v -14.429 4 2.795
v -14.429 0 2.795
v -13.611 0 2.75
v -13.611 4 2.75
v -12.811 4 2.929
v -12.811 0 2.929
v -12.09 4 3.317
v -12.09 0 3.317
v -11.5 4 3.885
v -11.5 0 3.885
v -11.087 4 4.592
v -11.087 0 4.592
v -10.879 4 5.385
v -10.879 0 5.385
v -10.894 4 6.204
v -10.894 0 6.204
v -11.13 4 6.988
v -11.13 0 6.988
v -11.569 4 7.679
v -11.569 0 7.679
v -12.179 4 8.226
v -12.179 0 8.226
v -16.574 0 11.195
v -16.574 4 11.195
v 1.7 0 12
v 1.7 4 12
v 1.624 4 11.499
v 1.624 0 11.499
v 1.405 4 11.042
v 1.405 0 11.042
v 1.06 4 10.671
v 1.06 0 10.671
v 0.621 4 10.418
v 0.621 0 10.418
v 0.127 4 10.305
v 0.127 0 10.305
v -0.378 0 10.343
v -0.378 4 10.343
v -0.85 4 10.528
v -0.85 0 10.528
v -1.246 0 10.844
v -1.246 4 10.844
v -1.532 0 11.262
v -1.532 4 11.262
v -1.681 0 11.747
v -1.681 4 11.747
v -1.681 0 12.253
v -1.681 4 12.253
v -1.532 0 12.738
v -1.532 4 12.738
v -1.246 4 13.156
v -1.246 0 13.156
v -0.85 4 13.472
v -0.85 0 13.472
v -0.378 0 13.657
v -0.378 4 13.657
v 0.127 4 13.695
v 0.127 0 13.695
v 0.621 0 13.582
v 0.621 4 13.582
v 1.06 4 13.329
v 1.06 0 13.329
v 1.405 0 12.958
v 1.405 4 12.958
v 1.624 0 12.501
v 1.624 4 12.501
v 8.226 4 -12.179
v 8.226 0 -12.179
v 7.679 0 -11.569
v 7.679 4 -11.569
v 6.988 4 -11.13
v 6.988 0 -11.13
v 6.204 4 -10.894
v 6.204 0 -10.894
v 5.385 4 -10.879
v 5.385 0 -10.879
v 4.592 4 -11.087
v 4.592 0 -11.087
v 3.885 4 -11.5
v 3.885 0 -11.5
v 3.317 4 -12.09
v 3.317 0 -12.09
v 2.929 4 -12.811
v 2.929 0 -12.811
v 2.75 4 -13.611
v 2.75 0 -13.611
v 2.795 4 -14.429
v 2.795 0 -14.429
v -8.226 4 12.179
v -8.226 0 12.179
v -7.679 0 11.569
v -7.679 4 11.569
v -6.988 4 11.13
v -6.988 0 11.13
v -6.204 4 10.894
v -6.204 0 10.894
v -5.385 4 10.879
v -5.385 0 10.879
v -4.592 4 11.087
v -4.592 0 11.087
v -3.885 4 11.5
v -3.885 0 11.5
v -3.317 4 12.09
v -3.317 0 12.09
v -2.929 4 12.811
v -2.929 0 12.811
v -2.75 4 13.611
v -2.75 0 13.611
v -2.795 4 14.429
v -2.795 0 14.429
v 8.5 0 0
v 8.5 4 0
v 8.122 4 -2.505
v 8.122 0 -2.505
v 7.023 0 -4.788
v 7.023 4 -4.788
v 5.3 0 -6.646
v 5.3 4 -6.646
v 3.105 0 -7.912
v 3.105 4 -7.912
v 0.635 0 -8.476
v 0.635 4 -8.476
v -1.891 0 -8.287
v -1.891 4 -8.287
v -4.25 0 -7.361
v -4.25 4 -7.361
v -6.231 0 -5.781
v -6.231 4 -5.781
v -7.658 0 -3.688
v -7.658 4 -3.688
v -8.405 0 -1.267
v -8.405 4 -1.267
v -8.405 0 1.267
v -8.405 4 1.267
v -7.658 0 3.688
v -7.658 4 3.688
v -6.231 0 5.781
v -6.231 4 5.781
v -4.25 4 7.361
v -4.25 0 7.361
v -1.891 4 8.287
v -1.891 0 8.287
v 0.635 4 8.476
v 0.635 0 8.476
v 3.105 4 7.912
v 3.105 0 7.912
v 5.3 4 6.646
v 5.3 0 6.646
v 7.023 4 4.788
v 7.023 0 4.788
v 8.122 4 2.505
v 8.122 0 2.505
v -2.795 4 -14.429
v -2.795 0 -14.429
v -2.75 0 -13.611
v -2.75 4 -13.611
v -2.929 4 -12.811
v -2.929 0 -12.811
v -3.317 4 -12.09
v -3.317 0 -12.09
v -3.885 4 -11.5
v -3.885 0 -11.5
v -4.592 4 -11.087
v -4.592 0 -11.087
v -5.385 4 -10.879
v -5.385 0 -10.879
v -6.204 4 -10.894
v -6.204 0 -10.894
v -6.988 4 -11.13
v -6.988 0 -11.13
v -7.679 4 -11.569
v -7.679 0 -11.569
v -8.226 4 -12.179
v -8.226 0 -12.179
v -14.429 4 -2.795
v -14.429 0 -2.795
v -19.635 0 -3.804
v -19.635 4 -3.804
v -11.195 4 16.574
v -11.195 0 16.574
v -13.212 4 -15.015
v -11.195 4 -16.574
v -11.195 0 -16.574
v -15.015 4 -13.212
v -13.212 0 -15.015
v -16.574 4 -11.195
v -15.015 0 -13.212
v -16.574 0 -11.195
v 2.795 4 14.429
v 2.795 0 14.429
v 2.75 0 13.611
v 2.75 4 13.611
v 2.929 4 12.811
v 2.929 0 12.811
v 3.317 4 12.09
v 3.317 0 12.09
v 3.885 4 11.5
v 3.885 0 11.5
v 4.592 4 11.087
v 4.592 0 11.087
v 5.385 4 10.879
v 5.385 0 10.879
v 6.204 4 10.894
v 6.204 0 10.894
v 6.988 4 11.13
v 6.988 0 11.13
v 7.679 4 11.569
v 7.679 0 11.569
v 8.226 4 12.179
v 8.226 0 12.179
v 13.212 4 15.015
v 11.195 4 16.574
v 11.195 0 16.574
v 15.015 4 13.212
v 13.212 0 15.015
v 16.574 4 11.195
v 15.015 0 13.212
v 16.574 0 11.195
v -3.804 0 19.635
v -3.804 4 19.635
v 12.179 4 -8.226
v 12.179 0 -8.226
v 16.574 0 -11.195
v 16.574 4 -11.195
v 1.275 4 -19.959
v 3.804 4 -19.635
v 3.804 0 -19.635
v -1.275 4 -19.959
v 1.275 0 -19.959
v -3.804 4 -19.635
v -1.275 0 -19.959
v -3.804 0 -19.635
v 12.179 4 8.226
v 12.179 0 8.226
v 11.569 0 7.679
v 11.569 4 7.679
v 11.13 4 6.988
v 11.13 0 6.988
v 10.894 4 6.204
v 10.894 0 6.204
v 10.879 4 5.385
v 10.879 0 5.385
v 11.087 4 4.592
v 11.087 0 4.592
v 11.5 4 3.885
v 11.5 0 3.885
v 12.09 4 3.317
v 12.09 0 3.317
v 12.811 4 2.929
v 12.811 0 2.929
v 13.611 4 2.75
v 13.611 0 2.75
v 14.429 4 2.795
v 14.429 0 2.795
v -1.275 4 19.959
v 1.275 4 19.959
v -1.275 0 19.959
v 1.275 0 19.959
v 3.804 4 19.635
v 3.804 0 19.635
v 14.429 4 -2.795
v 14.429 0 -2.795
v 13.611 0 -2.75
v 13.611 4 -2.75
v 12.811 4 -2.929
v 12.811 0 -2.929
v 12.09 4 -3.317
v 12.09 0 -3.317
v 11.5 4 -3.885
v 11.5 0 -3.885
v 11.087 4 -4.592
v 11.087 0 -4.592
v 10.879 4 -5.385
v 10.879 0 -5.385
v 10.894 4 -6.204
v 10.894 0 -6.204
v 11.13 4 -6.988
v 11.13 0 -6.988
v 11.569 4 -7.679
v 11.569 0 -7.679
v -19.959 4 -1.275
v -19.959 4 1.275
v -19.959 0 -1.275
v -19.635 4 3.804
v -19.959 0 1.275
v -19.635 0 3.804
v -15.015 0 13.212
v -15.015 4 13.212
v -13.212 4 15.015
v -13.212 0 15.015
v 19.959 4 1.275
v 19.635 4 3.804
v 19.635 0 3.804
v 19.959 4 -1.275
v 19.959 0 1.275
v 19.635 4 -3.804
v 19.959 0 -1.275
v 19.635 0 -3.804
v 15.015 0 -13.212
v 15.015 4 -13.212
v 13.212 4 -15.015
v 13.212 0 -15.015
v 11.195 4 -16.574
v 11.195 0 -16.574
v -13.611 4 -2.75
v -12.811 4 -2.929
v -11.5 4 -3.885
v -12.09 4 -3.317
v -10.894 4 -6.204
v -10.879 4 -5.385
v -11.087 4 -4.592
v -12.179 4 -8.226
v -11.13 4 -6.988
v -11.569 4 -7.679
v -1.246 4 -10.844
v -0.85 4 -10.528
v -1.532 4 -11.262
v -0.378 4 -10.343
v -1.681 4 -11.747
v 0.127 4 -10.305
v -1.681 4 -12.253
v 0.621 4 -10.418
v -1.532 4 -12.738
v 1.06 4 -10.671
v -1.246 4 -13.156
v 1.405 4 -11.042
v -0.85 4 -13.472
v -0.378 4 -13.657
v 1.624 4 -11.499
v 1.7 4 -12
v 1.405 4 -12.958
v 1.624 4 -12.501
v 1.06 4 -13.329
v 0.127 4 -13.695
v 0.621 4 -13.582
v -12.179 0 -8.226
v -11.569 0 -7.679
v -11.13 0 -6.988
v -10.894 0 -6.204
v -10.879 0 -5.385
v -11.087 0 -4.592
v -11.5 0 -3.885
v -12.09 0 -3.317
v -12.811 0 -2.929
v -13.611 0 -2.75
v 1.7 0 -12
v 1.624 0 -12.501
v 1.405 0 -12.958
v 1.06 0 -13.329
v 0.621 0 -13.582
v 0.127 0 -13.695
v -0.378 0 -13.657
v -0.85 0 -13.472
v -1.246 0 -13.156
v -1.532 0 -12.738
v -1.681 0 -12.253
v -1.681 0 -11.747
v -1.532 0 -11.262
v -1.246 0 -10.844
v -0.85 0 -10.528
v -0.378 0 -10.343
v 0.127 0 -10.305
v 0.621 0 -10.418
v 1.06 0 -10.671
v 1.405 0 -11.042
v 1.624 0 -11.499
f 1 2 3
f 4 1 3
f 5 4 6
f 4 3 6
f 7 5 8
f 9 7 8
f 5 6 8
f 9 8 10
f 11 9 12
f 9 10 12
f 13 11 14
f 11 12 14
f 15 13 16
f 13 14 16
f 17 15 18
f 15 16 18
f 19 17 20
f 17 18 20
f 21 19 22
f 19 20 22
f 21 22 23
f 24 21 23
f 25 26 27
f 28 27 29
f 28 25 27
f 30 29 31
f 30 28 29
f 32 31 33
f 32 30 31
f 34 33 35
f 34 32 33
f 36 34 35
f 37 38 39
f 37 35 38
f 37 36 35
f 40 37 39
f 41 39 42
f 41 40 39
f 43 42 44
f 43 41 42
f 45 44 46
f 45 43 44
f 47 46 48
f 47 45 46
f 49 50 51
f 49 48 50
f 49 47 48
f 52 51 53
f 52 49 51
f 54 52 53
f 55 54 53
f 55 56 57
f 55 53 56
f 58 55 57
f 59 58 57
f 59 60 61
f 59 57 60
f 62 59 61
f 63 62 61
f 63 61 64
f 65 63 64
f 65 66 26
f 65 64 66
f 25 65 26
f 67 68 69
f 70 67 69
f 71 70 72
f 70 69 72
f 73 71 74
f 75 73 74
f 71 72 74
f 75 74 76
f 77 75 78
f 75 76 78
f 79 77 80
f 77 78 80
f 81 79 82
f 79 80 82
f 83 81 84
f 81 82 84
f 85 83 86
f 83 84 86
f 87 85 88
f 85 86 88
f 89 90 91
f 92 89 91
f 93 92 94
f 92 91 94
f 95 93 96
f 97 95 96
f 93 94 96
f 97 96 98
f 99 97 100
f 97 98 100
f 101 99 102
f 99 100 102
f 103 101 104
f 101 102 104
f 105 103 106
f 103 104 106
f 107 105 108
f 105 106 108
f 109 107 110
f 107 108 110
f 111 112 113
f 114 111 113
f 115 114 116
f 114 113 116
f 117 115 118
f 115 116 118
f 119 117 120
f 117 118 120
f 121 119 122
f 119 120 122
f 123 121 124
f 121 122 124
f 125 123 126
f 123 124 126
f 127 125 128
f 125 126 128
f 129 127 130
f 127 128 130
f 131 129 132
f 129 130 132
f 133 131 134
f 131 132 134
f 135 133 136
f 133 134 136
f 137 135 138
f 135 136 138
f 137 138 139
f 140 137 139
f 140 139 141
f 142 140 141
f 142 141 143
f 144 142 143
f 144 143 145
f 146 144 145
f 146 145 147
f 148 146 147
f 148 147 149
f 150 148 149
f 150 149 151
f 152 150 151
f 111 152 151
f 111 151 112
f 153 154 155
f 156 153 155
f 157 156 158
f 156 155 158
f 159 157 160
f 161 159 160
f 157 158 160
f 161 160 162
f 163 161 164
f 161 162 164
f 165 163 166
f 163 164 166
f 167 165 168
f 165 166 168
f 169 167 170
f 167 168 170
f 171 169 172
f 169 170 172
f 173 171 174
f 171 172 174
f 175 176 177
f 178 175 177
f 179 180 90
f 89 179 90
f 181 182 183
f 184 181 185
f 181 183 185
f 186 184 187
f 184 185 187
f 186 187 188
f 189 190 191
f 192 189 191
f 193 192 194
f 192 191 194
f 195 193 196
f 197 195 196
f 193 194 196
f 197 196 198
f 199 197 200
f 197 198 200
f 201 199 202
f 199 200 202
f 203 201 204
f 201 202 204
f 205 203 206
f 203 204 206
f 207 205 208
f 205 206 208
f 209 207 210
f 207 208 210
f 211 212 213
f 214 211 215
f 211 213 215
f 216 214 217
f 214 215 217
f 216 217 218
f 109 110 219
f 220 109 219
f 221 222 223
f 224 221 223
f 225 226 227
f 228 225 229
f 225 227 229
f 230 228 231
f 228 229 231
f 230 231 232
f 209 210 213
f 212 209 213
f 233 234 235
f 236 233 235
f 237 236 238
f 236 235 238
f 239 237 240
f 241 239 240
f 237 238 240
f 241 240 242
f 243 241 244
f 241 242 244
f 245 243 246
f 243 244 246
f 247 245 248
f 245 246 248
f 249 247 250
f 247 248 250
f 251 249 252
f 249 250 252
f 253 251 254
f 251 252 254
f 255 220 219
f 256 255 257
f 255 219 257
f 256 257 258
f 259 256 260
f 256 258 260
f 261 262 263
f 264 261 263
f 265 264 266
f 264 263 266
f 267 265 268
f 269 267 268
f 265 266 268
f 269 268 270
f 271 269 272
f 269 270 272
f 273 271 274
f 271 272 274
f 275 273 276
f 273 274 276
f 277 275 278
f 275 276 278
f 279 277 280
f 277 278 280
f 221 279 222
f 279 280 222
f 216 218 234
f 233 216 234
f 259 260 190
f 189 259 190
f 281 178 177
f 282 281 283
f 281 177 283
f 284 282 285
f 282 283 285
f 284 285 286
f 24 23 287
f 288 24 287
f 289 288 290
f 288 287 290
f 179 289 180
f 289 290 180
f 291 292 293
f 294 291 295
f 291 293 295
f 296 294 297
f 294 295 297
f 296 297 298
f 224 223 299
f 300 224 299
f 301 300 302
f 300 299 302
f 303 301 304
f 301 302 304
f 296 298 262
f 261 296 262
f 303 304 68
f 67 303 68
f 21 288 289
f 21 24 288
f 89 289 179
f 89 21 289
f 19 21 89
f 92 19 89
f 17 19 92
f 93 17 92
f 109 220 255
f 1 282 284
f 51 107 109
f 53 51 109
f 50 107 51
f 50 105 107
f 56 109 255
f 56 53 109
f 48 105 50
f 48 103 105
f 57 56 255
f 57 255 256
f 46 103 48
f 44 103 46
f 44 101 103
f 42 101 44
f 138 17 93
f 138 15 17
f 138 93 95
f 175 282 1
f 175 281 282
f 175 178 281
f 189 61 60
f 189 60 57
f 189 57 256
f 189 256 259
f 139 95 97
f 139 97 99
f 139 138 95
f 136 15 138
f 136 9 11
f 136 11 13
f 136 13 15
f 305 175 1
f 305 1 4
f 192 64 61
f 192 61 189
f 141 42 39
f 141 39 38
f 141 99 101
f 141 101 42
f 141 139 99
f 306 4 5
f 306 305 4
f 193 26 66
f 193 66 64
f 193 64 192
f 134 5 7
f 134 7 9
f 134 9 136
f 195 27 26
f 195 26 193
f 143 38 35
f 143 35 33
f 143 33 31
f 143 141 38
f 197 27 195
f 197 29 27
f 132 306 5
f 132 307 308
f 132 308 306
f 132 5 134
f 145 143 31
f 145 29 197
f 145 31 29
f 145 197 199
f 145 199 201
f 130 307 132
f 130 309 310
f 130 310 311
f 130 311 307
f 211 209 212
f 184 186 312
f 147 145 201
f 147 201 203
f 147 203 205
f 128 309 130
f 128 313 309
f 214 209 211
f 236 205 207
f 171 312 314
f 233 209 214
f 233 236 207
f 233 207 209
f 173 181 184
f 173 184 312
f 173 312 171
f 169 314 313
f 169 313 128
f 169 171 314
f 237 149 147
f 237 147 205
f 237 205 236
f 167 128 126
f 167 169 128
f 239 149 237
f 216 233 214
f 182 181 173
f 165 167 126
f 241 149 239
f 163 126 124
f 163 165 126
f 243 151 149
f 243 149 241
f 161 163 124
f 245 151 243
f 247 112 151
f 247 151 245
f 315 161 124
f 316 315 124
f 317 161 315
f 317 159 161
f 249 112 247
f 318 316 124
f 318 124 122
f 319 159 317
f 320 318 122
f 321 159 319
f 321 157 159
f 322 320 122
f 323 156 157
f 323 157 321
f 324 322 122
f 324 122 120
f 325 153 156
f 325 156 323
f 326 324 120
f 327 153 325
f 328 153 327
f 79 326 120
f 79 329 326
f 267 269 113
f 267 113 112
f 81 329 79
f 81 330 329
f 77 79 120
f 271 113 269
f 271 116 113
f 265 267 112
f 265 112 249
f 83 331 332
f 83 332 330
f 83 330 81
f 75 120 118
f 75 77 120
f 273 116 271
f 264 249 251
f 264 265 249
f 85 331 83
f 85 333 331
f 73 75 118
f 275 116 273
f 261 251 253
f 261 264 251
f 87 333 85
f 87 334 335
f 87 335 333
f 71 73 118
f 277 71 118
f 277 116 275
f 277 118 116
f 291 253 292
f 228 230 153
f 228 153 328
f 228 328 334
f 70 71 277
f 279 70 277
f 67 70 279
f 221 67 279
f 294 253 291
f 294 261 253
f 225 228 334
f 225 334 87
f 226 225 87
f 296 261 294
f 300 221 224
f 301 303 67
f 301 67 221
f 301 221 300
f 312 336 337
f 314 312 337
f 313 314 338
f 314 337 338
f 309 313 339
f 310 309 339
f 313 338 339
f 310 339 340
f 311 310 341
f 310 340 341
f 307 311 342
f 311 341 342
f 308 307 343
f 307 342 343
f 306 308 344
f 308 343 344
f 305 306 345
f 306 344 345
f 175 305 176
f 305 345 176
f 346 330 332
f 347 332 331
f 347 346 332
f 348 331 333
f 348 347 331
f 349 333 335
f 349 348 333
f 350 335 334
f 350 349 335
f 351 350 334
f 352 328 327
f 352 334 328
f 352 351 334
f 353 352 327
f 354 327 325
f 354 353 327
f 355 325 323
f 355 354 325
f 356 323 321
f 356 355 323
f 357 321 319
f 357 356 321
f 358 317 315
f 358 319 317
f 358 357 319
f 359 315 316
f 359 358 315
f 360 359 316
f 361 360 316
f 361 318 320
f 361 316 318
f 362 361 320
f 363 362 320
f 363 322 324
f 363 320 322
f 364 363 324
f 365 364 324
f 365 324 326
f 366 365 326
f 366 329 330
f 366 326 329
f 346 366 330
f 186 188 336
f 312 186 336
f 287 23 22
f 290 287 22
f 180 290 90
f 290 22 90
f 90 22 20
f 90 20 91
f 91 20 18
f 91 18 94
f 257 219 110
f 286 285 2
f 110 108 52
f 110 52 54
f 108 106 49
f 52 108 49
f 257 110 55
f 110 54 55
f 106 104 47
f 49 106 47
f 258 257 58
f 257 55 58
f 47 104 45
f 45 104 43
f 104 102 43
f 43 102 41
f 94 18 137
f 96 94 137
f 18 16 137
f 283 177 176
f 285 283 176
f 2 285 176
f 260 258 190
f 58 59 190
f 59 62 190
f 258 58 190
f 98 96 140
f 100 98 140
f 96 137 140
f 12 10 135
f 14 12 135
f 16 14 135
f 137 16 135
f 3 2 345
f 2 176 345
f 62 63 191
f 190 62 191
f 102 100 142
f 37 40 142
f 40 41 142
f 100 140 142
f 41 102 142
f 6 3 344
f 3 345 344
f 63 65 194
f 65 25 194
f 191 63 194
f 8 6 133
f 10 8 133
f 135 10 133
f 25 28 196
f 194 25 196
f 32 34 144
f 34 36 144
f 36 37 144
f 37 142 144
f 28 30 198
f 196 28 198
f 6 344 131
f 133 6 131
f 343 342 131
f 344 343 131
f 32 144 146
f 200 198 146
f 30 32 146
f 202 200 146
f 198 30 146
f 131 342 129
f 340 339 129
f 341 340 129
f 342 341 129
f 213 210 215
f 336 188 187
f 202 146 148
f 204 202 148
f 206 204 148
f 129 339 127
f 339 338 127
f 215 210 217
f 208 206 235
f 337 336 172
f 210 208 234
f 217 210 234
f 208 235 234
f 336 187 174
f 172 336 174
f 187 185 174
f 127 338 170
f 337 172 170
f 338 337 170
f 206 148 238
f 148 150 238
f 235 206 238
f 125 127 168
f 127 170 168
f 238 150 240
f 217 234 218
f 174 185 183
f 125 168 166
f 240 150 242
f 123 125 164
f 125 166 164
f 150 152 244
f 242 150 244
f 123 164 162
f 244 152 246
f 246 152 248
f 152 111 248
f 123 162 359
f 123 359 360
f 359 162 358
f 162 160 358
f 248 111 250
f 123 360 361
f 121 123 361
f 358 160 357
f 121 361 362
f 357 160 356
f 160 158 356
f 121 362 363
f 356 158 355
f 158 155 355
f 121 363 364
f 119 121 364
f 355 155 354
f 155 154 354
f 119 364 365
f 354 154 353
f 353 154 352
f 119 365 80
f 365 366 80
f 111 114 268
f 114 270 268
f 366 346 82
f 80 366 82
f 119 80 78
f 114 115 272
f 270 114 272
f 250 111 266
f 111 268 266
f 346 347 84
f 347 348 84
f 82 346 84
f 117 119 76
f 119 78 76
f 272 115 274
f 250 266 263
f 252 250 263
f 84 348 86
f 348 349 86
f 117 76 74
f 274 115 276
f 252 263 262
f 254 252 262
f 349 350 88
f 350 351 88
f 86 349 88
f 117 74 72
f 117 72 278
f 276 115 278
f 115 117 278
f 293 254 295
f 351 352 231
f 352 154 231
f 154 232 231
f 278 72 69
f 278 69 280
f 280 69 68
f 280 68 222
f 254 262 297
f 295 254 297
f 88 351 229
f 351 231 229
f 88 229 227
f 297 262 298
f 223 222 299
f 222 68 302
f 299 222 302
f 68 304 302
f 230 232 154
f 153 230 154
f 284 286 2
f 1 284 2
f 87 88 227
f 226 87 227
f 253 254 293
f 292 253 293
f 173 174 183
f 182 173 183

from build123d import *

# Parameters (mm, degrees)
SKETCH1_R           = 20
BOSS_EXTRUDE1_DEPTH = 4
CUT_EXTRUDE1_REACH  = 6
SKETCH2_R           = 4
SKETCH2_R_2         = 1.7
CUT_EXTRUDE3_DEPTH  = 4
CIRPATTERN1_COUNT   = 8
SKETCH4_R           = 8.5
CUT_EXTRUDE4_DEPTH  = 5


with BuildPart() as part:
    # Sketch1 → Boss-Extrude1 (new body)
    with BuildSketch(Plane(origin=(0, 0, 0), x_dir=(1, 0, 0), z_dir=(0, 1, 0))):
        Circle(SKETCH1_R)
    extrude(amount=BOSS_EXTRUDE1_DEPTH)

    # Sketch2 → Cut-Extrude1 (cut, up to next)
    with BuildSketch(Plane(origin=(0, 0, 0), x_dir=(1, 0, 0), z_dir=(0, 1, 0)), mode=Mode.PRIVATE) as cut_extrude1_sk1:
        Circle(SKETCH2_R)
    cut_extrude1_tool1 = extrude(cut_extrude1_sk1.sketch, amount=CUT_EXTRUDE1_REACH, mode=Mode.PRIVATE) & part.part
    add(cut_extrude1_tool1.solids().sort_by_distance((0, 0, 0))[0], mode=Mode.SUBTRACT)
    # Sketch2 → Cut-Extrude1 (cut, up to next)
    with BuildSketch(Plane(origin=(0, 0, 0), x_dir=(1, 0, 0), z_dir=(0, 1, 0)), mode=Mode.PRIVATE) as cut_extrude1_sk2:
        with Locations((0, 12)):
            Circle(SKETCH2_R_2)
    cut_extrude1_tool2 = extrude(cut_extrude1_sk2.sketch, amount=CUT_EXTRUDE1_REACH, mode=Mode.PRIVATE) & part.part
    add(cut_extrude1_tool2.solids().sort_by_distance((0, 0, -12))[0], mode=Mode.SUBTRACT)
    # Sketch2 → Cut-Extrude1 (cut, up to next)
    with BuildSketch(Plane(origin=(0, 0, 0), x_dir=(1, 0, 0), z_dir=(0, 1, 0)), mode=Mode.PRIVATE) as cut_extrude1_sk3:
        with Locations((0, -12)):
            Circle(SKETCH2_R_2)
    cut_extrude1_tool3 = extrude(cut_extrude1_sk3.sketch, amount=CUT_EXTRUDE1_REACH, mode=Mode.PRIVATE) & part.part
    add(cut_extrude1_tool3.solids().sort_by_distance((0, 0, 12))[0], mode=Mode.SUBTRACT)

    # Sketch3 → Cut-Extrude3 (cut)
    with BuildSketch(Plane(origin=(0, 0, 0), x_dir=(1, 0, 0), z_dir=(0, 1, 0))):
        with BuildLine():
            ThreePointArc((3.803515008, 19.635001237), (7.653668647, 18.47759065), (11.194551269, 16.573533778))
            Line((11.194551269, 16.573533778), (8.226281552, 12.179010297))
            ThreePointArc((8.226281552, 12.179010297), (4.592201188, 11.08655439), (2.7950013, 14.428720239))
            Line((2.7950013, 14.428720239), (3.803515008, 19.635001237))
        make_face()
    cut_extrude3 = extrude(amount=CUT_EXTRUDE3_DEPTH, mode=Mode.SUBTRACT)

    # CirPattern1: Cut-Extrude3 ×8 about axis
    cirpattern1_axis = Axis((0, 0, 0), (0, 1, 0))
    for i in range(1, CIRPATTERN1_COUNT):
        add(cut_extrude3.rotate(cirpattern1_axis, i * 360 / CIRPATTERN1_COUNT), mode=Mode.SUBTRACT)

    # Sketch4 → Cut-Extrude4 (cut, through all)
    with BuildSketch(Plane(origin=(0, 4, 0), x_dir=(1, 0, 0), z_dir=(0, 1, 0))):
        Circle(SKETCH4_R)
    extrude(amount=-CUT_EXTRUDE4_DEPTH, mode=Mode.SUBTRACT)


solid = part.part
